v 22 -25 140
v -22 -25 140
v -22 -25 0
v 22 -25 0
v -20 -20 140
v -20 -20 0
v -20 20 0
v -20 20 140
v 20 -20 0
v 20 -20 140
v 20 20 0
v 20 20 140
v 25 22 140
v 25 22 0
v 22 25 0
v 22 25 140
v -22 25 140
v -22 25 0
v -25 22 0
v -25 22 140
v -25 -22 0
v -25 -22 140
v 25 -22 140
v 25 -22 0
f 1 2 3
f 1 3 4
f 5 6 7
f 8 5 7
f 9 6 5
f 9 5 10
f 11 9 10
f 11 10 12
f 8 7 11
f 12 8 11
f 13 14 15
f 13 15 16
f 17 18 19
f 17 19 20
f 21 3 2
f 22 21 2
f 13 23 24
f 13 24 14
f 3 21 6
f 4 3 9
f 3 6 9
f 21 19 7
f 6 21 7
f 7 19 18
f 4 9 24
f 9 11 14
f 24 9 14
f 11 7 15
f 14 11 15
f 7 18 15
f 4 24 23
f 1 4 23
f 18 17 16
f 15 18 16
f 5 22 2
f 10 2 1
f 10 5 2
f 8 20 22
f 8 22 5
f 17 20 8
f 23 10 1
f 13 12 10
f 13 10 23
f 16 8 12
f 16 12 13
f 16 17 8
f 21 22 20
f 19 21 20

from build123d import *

# Parameters (mm, degrees)
F0_W     = 50
F0_H     = 50
F0_W_2   = 40
F0_H_2   = 40
F1_DEPTH = 140
F2_SIZE  = 3


with BuildPart() as f1:
    # F0 (on Top) → F1 (new body)
    with BuildSketch(Plane.XY):
        Rectangle(F0_W, F0_H)
        Rectangle(F0_W_2, F0_H_2, mode=Mode.SUBTRACT)
    extrude(amount=F1_DEPTH)

    # F2
    f2_edges = [f1.edges().sort_by_distance(p)[0] for p in [
        (25, -25, 70),
        (-25, -25, 70),
        (25, 25, 70),
        (-25, 25, 70),
    ]]
    chamfer(f2_edges, length=F2_SIZE)


solid = f1.part
